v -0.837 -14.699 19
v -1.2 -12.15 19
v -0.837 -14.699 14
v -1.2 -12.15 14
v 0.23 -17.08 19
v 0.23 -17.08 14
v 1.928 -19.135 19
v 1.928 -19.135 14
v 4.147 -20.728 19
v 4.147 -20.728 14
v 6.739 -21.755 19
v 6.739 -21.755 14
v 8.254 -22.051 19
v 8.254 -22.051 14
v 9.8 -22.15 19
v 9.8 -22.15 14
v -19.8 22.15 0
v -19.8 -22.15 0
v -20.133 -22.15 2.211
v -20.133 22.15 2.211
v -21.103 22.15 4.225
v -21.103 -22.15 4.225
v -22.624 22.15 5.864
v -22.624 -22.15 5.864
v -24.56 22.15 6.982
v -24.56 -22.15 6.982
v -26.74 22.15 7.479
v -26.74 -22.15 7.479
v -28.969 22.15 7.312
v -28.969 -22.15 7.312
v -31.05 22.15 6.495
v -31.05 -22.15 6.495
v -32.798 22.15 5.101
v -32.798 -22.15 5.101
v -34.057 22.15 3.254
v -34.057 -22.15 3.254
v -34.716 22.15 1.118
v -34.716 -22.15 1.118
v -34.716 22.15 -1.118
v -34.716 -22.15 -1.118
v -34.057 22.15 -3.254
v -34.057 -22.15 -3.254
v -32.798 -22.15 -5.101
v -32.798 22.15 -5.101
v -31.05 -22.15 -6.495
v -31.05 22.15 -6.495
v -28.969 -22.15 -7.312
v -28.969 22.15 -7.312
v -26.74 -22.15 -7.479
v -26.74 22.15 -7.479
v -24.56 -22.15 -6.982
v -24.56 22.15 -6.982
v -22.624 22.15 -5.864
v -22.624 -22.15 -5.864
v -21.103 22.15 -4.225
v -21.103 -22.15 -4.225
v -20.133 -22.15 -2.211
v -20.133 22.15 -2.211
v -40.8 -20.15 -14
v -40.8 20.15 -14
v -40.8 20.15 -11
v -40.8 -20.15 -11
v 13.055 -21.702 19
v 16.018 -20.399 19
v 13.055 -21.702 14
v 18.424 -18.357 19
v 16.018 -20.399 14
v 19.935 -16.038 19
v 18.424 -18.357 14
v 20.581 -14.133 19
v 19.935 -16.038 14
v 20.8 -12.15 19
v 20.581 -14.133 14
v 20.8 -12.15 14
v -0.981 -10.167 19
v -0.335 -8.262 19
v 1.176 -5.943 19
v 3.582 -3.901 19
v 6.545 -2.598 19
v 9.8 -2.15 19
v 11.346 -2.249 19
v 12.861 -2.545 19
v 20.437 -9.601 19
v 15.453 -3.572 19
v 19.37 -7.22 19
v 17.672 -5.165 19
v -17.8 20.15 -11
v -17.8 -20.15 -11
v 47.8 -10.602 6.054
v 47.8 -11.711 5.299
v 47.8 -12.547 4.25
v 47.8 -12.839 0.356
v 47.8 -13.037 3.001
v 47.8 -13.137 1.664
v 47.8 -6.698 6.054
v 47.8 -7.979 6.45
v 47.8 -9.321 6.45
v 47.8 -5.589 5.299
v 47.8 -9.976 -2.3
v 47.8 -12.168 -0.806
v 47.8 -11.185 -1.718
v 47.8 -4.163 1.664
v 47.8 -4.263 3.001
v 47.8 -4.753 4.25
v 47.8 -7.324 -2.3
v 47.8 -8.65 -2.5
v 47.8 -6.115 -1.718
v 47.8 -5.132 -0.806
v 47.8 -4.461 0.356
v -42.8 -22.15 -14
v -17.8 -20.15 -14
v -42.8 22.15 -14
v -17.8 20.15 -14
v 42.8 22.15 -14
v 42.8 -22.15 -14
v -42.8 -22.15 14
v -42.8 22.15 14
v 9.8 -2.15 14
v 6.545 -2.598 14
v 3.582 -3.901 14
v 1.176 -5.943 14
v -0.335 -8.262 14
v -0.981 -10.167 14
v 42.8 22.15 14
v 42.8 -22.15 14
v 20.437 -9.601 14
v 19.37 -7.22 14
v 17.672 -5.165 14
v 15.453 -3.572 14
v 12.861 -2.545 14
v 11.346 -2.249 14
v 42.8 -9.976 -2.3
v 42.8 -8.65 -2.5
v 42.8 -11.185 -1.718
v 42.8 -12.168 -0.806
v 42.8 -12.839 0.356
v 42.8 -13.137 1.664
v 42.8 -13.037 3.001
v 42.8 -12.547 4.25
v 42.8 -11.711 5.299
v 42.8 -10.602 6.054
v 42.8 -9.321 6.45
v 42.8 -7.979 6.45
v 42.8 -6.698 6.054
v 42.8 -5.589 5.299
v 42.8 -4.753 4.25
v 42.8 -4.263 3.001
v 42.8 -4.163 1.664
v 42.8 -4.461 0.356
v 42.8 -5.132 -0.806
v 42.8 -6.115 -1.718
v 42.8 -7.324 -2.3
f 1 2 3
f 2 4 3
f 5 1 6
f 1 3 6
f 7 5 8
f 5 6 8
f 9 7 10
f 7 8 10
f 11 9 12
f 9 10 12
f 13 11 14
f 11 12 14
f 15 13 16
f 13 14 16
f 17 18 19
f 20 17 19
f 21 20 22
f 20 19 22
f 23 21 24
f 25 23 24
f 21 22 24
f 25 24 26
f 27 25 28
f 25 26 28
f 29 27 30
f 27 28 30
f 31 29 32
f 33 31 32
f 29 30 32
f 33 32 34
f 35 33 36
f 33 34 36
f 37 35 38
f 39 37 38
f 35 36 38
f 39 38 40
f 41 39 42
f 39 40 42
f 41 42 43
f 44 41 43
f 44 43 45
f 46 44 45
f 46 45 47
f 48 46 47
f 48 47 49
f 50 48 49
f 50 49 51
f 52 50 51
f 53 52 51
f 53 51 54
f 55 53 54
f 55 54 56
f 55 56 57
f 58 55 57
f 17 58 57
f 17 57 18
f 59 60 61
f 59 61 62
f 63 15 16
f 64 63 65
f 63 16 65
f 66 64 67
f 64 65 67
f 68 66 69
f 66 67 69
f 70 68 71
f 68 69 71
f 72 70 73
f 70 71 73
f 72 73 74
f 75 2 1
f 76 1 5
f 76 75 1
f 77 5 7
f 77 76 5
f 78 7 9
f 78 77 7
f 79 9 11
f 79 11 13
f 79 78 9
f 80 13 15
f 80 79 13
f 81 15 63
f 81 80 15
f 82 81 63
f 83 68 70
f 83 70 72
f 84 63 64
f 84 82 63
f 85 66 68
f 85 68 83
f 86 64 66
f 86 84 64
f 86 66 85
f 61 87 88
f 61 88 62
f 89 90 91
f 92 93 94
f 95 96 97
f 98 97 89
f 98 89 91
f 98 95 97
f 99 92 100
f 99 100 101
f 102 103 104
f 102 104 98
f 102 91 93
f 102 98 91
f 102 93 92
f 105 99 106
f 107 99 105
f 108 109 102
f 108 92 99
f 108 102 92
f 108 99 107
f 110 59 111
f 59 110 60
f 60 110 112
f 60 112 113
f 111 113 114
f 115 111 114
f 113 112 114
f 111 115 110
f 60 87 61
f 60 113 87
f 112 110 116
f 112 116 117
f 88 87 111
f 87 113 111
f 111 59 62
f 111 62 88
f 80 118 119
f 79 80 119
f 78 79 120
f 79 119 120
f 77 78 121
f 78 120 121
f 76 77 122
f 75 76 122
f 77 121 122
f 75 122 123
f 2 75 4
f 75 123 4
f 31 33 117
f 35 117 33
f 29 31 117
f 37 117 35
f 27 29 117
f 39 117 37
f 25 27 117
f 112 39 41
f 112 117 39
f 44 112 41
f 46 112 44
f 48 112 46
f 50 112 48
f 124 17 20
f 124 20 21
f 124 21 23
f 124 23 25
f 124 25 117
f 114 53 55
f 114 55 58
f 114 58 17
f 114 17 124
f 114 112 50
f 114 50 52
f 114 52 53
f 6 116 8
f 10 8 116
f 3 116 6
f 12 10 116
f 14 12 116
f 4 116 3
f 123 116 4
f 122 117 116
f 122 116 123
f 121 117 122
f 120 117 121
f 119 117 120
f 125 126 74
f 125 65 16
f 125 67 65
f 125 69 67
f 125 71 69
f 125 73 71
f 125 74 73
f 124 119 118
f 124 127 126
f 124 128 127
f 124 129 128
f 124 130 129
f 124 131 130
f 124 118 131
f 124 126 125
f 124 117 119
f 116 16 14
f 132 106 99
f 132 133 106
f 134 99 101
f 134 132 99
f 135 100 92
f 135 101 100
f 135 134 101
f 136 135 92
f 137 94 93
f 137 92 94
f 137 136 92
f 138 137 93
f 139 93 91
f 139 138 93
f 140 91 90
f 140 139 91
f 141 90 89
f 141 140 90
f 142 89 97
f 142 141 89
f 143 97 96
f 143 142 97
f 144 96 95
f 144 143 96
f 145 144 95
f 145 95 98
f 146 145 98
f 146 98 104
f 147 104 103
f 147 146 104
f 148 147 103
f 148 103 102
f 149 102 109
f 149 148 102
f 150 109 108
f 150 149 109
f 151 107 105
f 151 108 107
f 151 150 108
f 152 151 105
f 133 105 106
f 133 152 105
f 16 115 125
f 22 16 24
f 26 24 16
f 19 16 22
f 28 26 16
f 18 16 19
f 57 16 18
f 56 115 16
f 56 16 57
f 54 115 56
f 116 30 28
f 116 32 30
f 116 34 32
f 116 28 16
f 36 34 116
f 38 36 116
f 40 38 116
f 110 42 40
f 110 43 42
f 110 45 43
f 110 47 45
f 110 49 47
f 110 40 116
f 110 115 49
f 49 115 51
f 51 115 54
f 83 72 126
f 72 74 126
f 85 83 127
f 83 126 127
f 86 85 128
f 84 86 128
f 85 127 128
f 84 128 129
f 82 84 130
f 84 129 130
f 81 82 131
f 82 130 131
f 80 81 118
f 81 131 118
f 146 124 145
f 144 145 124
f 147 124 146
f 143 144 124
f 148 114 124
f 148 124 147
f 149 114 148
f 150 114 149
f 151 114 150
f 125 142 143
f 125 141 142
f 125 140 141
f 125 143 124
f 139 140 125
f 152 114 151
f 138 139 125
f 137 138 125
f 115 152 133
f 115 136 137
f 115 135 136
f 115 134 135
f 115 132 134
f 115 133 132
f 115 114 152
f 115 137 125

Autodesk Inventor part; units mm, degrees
ref_plane "YZ Plane" through (0, 0, 0) normal (1, 0, 0) x (0, 1, 0)
ref_plane "XZ Plane" through (0, 0, 0) normal (0, 1, 0) x (-1, 0, 0)
ref_plane "XY Plane" through (0, 0, 0) normal (0, 0, 1) x (1, 0, 0)
sketch "Эскиз1" plane through (0, 0, 0) normal (0, 0, 1) x (1, 0, 0)
  line L0 (-42.8, 22.15) -> (42.8, 22.15)
  line L1 (42.8, 22.15) -> (42.8, -22.15)
  line L2 (42.8, -22.15) -> (-42.8, -22.15)
  line L3 (-42.8, -22.15) -> (-42.8, 22.15)
  line L4 (-42.8, 22.15) -> (42.8, -22.15) construction
  line L5 (42.8, 22.15) -> (-42.8, -22.15) construction
  point P0 (0, 0)
  dimension "d0" = 85.6
  dimension "d1" = 44.3
extrude "Выдавливание1" add sketch "Эскиз1" along normal mid plane 28
sketch "Эскиз2" plane through (0, 0, 14) normal (0, 0, 1) x (1, 0, 0)
  line L0 (-1.2, -2.15) -> (20.8, -2.15)
  line L1 (20.8, -2.15) -> (20.8, -22.15)
  line L2 (20.8, -22.15) -> (-1.2, -22.15)
  line L3 (-1.2, -22.15) -> (-1.2, -2.15)
  line L4 (-42.8, -22.15) -> (42.8, -22.15) projected
  line L5 (42.8, -22.15) -> (42.8, 22.15) projected
  ellipse E0 centre (9.8, -12.15) end of major axis (20.8, -12.15) minor radius 10
  point P0 (0, 0)
  point P1 (20.8, -12.15)
  point P2 (9.8, -2.15)
  point P3 (9.8, -22.15)
  point P4 (-1.2, -12.15)
  dimension "d4" = 20
  dimension "d5" = 44
  dimension "d6" = 22
extrude "Выдавливание2" add sketch "Эскиз2" along normal blind 5 contours E0
sketch "Эскиз3" plane through (42.8, -22.15, 14) normal (1, 0, 0) x (0, 0, -1)
  circle A0 centre (12, 13.5) radius 4.5
  line L0 (28, 0) -> (0, 0) projected
  line L1 (0, 0) -> (0, 44.3) projected
  point P0 (14, 22.15)
  dimension "d9" = 13.5
  dimension "d10" = 9
  dimension "d22" = 12
extrude "Выдавливание3" add sketch "Эскиз3" along normal blind 5
sketch "Эскиз4" plane through (-42.8, -22.15, -14) normal (0, -1, 0) x (1, 0, 0)
  circle A0 centre (15.5, 14) radius 7.5
  line L0 (0, 28) -> (0, 0) projected
  line L1 (0, 28) -> (52.6, 28) projected
  point P0 (42.8, 14)
  point P1 (41.6, 23)
  dimension "d13" = 15
  dimension "d14" = 15.5
  dimension "d21" = 14
extrude "Выдавливание4" cut sketch "Эскиз4" against normal through all
sketch "Эскиз5" plane through (0, 0, -14) normal (0, 0, -1) x (-1, 0, 0)
  line L0 (-42.8, -22.15) -> (42.8, -22.15) projected
  line L1 (42.8, -22.15) -> (42.8, 22.15) projected
  line L2 (42.8, 22.15) -> (-42.8, 22.15) projected
  line L3 (-42.8, 22.15) -> (-42.8, -22.15) projected
  line L4 (-40.8, 20.15) -> (40.8, 20.15)
  line L5 (40.8, 20.15) -> (40.8, -20.15)
  line L6 (40.8, -20.15) -> (-40.8, -20.15)
  line L7 (-40.8, -20.15) -> (-40.8, 20.15)
  line L8 (17.8, 20.15) -> (17.8, -20.15)
  dimension "d23" = 2
  dimension "d24" = 23
extrude "Выдавливание5" cut sketch "Эскиз5" against normal blind 3 contours L4 L5 L6 L8
properties part number "ЛЦМК0000002.00.00.00.00.05"
